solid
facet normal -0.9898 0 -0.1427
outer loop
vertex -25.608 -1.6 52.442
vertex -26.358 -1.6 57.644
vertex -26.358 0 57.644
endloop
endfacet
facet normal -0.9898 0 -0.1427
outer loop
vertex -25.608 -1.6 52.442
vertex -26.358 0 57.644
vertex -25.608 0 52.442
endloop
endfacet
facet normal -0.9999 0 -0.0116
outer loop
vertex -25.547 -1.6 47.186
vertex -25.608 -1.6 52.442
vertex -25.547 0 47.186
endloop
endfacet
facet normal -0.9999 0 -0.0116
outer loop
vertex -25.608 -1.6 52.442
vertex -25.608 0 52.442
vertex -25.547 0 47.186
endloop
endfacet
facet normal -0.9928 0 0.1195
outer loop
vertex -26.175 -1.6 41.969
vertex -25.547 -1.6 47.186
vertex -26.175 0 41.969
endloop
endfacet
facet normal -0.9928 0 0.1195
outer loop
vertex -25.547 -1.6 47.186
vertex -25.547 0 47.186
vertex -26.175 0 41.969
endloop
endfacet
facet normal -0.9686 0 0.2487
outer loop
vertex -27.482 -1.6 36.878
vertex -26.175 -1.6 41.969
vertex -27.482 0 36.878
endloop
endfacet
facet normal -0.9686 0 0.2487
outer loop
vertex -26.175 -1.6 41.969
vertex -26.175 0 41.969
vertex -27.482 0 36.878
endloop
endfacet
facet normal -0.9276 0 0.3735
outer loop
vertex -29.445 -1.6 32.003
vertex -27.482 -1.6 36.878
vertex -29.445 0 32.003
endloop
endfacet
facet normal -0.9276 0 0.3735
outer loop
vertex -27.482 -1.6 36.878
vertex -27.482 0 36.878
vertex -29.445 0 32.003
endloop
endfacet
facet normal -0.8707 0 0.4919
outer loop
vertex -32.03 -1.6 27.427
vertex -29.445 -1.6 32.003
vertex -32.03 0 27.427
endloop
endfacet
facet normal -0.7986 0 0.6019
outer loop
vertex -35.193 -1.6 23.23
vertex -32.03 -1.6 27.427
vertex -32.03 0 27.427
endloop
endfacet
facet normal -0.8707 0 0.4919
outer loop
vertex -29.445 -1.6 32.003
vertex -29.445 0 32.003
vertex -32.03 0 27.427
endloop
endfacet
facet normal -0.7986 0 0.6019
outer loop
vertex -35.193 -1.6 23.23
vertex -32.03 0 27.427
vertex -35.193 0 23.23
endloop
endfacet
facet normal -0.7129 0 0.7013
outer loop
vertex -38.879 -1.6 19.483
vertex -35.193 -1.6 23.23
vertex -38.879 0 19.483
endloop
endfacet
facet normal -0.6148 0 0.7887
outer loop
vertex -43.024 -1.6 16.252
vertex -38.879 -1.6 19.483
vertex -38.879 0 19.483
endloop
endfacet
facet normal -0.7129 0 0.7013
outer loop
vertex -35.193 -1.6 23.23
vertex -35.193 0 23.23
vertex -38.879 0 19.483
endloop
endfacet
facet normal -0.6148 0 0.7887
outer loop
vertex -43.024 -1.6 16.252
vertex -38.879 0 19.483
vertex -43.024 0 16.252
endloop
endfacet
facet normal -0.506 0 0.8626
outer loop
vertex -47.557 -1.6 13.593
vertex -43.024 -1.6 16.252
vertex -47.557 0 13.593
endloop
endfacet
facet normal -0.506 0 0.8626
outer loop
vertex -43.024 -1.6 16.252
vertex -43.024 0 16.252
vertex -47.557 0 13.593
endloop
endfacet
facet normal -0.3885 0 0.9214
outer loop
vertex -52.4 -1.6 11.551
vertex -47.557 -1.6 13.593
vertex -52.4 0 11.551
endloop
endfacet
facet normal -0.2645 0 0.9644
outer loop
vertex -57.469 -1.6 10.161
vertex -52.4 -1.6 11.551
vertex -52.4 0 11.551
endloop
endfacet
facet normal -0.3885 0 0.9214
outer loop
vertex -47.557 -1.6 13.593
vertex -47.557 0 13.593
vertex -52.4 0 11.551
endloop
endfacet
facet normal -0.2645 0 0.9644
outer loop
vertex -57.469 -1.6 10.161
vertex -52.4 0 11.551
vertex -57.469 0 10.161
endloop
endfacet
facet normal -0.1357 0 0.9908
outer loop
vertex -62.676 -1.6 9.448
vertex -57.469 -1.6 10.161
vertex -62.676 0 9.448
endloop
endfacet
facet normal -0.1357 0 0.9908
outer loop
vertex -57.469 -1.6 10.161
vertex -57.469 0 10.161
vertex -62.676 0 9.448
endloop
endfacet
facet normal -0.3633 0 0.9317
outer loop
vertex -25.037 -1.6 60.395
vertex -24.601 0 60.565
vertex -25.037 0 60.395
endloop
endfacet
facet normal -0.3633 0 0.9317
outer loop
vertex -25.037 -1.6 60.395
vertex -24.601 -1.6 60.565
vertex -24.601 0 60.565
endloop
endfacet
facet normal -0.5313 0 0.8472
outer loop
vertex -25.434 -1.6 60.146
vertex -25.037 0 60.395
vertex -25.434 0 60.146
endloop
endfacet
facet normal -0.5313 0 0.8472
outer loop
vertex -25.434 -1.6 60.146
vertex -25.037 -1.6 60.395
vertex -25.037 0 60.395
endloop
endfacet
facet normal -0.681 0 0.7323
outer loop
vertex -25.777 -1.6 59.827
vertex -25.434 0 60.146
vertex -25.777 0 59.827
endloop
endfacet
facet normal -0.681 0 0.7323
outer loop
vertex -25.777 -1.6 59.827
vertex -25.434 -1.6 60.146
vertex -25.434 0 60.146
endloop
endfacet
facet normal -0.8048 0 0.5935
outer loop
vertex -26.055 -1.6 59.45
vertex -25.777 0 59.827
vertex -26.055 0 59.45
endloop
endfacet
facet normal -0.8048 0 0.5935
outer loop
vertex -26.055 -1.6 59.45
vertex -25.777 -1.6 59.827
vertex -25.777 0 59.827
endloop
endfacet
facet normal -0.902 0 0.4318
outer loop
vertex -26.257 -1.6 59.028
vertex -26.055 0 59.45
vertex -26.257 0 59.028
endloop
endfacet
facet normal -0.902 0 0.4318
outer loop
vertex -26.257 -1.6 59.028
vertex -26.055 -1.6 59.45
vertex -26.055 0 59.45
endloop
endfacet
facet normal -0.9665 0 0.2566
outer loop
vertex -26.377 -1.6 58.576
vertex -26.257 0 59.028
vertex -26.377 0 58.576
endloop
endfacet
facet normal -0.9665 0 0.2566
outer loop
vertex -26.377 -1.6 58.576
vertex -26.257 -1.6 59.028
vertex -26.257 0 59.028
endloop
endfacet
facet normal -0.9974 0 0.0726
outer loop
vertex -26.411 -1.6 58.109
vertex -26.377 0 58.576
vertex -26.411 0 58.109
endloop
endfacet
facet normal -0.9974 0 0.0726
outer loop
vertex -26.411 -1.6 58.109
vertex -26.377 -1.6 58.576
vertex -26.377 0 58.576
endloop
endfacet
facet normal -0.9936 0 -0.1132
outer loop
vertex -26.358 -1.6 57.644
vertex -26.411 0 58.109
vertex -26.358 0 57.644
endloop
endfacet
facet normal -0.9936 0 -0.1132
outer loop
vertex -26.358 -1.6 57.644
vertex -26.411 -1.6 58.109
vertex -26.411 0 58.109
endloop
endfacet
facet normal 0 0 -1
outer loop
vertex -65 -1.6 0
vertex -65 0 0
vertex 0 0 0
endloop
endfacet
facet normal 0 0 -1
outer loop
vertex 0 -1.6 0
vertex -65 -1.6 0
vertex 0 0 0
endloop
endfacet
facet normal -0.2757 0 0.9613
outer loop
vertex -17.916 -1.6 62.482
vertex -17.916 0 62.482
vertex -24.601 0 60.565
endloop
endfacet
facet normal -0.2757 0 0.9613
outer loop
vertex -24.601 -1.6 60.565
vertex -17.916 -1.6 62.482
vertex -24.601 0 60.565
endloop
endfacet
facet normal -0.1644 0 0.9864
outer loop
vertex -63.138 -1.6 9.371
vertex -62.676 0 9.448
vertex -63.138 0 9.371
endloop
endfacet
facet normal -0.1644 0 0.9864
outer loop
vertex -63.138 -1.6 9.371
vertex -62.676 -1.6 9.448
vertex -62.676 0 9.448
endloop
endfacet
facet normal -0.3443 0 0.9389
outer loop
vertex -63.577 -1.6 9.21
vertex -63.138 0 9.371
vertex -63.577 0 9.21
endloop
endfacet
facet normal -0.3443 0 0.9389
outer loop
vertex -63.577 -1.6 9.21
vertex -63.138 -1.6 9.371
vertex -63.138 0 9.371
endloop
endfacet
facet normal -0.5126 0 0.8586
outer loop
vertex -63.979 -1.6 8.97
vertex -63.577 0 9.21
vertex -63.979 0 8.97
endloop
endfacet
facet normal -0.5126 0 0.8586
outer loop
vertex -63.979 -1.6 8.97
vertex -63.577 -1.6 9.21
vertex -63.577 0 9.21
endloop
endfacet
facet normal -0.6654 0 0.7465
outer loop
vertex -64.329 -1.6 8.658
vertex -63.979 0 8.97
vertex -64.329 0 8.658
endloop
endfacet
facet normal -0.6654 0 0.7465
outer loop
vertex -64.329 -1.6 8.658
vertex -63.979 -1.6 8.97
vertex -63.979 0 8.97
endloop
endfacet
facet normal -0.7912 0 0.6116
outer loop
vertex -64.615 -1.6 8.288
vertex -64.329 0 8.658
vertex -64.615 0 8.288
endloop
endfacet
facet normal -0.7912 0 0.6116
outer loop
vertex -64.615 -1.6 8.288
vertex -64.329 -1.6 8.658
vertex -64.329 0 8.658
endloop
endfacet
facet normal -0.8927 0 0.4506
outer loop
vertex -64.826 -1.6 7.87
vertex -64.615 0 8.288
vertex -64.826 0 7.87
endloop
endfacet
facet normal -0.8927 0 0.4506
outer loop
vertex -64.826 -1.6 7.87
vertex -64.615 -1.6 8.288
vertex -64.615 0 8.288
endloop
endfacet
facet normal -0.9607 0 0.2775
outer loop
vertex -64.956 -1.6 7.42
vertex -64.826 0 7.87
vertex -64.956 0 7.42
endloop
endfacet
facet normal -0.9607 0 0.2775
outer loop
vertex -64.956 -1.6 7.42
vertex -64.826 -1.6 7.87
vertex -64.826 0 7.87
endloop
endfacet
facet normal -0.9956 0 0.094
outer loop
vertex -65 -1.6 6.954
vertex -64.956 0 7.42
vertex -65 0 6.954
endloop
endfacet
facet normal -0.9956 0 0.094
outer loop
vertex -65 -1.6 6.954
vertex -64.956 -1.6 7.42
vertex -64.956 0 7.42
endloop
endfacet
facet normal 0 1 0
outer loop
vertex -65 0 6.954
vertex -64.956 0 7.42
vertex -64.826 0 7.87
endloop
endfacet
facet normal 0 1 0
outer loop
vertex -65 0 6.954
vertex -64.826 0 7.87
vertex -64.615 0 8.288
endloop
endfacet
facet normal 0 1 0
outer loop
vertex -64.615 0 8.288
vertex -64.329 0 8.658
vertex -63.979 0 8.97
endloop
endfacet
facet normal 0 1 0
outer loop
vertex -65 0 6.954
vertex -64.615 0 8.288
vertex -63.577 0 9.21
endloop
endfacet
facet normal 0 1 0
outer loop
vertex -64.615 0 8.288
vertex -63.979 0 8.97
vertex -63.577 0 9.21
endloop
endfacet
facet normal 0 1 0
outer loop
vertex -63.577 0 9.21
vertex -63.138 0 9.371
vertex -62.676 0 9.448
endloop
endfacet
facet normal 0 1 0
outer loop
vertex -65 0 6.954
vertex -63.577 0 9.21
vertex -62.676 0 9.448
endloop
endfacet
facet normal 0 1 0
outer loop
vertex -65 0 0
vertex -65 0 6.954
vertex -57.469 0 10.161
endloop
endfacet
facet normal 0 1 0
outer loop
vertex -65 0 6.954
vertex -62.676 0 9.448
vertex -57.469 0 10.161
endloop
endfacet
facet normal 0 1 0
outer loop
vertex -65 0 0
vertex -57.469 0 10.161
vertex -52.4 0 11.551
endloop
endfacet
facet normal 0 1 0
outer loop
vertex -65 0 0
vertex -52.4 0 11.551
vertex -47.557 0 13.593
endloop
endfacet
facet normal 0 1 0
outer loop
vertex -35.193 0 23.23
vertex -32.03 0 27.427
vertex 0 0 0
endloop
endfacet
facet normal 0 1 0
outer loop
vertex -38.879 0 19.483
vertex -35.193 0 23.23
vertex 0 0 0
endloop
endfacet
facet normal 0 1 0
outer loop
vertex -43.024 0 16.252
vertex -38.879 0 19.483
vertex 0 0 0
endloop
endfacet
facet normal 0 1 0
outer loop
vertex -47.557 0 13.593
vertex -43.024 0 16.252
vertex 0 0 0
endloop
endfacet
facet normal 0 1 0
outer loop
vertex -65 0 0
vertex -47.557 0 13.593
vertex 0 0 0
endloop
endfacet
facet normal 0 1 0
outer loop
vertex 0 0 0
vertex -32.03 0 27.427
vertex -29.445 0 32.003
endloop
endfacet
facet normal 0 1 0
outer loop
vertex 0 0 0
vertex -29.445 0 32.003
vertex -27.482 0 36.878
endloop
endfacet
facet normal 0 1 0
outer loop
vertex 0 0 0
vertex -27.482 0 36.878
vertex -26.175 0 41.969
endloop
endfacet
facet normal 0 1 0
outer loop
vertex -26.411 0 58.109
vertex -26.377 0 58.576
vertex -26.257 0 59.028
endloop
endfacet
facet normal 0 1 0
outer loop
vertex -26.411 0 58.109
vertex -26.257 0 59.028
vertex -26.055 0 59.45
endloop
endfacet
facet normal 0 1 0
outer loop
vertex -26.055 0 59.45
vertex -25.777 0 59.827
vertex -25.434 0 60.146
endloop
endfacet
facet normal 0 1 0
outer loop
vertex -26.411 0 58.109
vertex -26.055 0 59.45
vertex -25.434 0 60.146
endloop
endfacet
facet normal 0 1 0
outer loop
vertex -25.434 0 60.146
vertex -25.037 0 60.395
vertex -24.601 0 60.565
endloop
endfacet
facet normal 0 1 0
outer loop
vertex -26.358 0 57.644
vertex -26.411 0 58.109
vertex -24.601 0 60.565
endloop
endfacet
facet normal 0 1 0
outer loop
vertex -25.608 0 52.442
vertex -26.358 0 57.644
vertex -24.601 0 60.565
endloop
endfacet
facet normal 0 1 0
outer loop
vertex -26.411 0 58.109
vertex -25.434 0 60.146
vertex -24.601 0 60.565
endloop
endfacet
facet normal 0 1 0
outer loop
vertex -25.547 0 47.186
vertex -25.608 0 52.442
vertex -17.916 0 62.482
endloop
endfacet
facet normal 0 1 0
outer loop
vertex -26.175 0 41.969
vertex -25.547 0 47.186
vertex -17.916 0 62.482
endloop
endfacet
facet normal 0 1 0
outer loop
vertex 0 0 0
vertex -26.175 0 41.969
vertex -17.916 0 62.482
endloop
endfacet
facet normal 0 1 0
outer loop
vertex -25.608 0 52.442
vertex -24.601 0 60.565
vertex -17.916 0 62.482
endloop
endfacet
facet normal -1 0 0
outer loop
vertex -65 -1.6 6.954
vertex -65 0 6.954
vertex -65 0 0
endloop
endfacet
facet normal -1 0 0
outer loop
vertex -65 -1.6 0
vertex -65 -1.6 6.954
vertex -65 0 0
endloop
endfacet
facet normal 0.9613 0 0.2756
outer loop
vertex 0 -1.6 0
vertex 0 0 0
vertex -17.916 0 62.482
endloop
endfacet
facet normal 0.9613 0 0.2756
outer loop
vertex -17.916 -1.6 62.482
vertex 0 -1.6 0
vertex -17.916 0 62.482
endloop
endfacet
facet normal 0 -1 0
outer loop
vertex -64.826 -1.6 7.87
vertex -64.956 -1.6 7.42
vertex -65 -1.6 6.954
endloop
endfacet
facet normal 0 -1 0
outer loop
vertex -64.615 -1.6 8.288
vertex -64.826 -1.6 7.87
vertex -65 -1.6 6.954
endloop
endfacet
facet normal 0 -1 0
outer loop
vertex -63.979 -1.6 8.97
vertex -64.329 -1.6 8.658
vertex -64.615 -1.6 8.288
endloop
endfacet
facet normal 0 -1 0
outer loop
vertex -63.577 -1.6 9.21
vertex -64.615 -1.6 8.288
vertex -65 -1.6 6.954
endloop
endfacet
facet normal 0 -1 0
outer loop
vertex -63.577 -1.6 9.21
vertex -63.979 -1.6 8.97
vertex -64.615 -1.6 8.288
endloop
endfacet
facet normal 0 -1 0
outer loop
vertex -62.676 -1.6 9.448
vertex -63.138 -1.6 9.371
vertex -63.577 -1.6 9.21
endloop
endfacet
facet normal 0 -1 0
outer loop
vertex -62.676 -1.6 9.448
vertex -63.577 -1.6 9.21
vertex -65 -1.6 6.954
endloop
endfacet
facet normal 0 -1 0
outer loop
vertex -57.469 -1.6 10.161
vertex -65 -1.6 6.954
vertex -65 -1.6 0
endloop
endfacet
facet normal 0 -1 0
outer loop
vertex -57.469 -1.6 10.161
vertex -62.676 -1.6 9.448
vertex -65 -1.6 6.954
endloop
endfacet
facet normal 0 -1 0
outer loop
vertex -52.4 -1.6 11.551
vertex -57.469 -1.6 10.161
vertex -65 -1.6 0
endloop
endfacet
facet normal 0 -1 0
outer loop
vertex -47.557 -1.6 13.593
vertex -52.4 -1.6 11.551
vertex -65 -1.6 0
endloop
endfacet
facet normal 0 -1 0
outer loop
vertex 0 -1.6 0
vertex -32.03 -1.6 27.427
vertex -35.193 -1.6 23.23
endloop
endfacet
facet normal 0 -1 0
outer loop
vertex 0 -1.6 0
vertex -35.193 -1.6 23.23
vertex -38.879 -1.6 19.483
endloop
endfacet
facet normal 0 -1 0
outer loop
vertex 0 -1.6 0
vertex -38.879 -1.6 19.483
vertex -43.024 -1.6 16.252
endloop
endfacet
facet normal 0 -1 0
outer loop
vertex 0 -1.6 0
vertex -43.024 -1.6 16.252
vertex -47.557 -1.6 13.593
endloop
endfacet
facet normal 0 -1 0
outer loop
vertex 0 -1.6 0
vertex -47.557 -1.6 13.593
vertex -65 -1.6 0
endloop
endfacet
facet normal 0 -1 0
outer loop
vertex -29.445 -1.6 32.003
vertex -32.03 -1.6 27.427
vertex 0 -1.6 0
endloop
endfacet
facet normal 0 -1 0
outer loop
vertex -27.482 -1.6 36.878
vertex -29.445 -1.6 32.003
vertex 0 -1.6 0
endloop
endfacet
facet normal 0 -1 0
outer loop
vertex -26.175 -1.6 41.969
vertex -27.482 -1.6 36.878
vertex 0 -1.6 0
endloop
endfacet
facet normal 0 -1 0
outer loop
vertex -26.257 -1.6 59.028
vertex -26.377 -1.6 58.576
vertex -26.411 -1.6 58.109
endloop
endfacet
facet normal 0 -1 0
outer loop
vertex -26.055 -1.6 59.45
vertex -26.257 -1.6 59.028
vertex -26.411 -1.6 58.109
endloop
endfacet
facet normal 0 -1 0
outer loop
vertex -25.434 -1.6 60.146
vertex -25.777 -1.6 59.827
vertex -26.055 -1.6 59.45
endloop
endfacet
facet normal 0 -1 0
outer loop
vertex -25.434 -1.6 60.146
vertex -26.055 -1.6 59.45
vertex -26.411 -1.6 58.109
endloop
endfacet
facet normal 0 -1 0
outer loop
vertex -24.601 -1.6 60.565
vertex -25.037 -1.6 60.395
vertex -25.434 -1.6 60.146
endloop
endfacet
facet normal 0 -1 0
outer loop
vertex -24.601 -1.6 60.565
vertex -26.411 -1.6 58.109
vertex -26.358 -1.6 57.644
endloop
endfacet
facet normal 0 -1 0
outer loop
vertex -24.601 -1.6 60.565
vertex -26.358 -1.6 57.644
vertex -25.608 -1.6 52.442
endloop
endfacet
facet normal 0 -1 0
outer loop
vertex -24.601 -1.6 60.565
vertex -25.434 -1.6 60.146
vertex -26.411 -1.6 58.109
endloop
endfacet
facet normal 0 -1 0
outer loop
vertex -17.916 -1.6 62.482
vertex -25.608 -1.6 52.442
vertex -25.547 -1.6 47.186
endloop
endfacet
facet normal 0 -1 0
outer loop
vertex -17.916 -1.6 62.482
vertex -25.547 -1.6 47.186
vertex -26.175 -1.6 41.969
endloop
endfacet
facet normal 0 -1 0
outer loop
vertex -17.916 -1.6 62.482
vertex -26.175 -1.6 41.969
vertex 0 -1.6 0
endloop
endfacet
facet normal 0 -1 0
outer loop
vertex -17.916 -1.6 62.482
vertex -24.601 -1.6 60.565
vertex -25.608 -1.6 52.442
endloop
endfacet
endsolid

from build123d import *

# Parameters (mm, degrees)
F1_DEPTH = 1.6
F2_R     = 2.5


with BuildPart() as f1:
    # F0 (on Front) → F1 (new body)
    with BuildSketch(Plane.XZ):
        with BuildLine():
            Line((-65, 0), (0, 0))
            Line((0, 0), (-17.9164281281, 62.482010236))
            Line((-17.9164281281, 62.482010236), (-26.9059650358, 59.9043020076))
            ThreePointArc((-26.9059650358, 59.9043020076), (-33.542691422, 25.2762309724), (-65, 9.3518101738))
            Line((-65, 9.3518101738), (-65, 0))
        make_face()
    extrude(amount=F1_DEPTH)

    # F2
    f2_edges = [f1.edges().sort_by_distance(p)[0] for p in [
        (-26.905965, -0.8, 59.904302),
        (-65, -0.8, 9.35181),
    ]]
    fillet(f2_edges, radius=F2_R)


solid = f1.part
